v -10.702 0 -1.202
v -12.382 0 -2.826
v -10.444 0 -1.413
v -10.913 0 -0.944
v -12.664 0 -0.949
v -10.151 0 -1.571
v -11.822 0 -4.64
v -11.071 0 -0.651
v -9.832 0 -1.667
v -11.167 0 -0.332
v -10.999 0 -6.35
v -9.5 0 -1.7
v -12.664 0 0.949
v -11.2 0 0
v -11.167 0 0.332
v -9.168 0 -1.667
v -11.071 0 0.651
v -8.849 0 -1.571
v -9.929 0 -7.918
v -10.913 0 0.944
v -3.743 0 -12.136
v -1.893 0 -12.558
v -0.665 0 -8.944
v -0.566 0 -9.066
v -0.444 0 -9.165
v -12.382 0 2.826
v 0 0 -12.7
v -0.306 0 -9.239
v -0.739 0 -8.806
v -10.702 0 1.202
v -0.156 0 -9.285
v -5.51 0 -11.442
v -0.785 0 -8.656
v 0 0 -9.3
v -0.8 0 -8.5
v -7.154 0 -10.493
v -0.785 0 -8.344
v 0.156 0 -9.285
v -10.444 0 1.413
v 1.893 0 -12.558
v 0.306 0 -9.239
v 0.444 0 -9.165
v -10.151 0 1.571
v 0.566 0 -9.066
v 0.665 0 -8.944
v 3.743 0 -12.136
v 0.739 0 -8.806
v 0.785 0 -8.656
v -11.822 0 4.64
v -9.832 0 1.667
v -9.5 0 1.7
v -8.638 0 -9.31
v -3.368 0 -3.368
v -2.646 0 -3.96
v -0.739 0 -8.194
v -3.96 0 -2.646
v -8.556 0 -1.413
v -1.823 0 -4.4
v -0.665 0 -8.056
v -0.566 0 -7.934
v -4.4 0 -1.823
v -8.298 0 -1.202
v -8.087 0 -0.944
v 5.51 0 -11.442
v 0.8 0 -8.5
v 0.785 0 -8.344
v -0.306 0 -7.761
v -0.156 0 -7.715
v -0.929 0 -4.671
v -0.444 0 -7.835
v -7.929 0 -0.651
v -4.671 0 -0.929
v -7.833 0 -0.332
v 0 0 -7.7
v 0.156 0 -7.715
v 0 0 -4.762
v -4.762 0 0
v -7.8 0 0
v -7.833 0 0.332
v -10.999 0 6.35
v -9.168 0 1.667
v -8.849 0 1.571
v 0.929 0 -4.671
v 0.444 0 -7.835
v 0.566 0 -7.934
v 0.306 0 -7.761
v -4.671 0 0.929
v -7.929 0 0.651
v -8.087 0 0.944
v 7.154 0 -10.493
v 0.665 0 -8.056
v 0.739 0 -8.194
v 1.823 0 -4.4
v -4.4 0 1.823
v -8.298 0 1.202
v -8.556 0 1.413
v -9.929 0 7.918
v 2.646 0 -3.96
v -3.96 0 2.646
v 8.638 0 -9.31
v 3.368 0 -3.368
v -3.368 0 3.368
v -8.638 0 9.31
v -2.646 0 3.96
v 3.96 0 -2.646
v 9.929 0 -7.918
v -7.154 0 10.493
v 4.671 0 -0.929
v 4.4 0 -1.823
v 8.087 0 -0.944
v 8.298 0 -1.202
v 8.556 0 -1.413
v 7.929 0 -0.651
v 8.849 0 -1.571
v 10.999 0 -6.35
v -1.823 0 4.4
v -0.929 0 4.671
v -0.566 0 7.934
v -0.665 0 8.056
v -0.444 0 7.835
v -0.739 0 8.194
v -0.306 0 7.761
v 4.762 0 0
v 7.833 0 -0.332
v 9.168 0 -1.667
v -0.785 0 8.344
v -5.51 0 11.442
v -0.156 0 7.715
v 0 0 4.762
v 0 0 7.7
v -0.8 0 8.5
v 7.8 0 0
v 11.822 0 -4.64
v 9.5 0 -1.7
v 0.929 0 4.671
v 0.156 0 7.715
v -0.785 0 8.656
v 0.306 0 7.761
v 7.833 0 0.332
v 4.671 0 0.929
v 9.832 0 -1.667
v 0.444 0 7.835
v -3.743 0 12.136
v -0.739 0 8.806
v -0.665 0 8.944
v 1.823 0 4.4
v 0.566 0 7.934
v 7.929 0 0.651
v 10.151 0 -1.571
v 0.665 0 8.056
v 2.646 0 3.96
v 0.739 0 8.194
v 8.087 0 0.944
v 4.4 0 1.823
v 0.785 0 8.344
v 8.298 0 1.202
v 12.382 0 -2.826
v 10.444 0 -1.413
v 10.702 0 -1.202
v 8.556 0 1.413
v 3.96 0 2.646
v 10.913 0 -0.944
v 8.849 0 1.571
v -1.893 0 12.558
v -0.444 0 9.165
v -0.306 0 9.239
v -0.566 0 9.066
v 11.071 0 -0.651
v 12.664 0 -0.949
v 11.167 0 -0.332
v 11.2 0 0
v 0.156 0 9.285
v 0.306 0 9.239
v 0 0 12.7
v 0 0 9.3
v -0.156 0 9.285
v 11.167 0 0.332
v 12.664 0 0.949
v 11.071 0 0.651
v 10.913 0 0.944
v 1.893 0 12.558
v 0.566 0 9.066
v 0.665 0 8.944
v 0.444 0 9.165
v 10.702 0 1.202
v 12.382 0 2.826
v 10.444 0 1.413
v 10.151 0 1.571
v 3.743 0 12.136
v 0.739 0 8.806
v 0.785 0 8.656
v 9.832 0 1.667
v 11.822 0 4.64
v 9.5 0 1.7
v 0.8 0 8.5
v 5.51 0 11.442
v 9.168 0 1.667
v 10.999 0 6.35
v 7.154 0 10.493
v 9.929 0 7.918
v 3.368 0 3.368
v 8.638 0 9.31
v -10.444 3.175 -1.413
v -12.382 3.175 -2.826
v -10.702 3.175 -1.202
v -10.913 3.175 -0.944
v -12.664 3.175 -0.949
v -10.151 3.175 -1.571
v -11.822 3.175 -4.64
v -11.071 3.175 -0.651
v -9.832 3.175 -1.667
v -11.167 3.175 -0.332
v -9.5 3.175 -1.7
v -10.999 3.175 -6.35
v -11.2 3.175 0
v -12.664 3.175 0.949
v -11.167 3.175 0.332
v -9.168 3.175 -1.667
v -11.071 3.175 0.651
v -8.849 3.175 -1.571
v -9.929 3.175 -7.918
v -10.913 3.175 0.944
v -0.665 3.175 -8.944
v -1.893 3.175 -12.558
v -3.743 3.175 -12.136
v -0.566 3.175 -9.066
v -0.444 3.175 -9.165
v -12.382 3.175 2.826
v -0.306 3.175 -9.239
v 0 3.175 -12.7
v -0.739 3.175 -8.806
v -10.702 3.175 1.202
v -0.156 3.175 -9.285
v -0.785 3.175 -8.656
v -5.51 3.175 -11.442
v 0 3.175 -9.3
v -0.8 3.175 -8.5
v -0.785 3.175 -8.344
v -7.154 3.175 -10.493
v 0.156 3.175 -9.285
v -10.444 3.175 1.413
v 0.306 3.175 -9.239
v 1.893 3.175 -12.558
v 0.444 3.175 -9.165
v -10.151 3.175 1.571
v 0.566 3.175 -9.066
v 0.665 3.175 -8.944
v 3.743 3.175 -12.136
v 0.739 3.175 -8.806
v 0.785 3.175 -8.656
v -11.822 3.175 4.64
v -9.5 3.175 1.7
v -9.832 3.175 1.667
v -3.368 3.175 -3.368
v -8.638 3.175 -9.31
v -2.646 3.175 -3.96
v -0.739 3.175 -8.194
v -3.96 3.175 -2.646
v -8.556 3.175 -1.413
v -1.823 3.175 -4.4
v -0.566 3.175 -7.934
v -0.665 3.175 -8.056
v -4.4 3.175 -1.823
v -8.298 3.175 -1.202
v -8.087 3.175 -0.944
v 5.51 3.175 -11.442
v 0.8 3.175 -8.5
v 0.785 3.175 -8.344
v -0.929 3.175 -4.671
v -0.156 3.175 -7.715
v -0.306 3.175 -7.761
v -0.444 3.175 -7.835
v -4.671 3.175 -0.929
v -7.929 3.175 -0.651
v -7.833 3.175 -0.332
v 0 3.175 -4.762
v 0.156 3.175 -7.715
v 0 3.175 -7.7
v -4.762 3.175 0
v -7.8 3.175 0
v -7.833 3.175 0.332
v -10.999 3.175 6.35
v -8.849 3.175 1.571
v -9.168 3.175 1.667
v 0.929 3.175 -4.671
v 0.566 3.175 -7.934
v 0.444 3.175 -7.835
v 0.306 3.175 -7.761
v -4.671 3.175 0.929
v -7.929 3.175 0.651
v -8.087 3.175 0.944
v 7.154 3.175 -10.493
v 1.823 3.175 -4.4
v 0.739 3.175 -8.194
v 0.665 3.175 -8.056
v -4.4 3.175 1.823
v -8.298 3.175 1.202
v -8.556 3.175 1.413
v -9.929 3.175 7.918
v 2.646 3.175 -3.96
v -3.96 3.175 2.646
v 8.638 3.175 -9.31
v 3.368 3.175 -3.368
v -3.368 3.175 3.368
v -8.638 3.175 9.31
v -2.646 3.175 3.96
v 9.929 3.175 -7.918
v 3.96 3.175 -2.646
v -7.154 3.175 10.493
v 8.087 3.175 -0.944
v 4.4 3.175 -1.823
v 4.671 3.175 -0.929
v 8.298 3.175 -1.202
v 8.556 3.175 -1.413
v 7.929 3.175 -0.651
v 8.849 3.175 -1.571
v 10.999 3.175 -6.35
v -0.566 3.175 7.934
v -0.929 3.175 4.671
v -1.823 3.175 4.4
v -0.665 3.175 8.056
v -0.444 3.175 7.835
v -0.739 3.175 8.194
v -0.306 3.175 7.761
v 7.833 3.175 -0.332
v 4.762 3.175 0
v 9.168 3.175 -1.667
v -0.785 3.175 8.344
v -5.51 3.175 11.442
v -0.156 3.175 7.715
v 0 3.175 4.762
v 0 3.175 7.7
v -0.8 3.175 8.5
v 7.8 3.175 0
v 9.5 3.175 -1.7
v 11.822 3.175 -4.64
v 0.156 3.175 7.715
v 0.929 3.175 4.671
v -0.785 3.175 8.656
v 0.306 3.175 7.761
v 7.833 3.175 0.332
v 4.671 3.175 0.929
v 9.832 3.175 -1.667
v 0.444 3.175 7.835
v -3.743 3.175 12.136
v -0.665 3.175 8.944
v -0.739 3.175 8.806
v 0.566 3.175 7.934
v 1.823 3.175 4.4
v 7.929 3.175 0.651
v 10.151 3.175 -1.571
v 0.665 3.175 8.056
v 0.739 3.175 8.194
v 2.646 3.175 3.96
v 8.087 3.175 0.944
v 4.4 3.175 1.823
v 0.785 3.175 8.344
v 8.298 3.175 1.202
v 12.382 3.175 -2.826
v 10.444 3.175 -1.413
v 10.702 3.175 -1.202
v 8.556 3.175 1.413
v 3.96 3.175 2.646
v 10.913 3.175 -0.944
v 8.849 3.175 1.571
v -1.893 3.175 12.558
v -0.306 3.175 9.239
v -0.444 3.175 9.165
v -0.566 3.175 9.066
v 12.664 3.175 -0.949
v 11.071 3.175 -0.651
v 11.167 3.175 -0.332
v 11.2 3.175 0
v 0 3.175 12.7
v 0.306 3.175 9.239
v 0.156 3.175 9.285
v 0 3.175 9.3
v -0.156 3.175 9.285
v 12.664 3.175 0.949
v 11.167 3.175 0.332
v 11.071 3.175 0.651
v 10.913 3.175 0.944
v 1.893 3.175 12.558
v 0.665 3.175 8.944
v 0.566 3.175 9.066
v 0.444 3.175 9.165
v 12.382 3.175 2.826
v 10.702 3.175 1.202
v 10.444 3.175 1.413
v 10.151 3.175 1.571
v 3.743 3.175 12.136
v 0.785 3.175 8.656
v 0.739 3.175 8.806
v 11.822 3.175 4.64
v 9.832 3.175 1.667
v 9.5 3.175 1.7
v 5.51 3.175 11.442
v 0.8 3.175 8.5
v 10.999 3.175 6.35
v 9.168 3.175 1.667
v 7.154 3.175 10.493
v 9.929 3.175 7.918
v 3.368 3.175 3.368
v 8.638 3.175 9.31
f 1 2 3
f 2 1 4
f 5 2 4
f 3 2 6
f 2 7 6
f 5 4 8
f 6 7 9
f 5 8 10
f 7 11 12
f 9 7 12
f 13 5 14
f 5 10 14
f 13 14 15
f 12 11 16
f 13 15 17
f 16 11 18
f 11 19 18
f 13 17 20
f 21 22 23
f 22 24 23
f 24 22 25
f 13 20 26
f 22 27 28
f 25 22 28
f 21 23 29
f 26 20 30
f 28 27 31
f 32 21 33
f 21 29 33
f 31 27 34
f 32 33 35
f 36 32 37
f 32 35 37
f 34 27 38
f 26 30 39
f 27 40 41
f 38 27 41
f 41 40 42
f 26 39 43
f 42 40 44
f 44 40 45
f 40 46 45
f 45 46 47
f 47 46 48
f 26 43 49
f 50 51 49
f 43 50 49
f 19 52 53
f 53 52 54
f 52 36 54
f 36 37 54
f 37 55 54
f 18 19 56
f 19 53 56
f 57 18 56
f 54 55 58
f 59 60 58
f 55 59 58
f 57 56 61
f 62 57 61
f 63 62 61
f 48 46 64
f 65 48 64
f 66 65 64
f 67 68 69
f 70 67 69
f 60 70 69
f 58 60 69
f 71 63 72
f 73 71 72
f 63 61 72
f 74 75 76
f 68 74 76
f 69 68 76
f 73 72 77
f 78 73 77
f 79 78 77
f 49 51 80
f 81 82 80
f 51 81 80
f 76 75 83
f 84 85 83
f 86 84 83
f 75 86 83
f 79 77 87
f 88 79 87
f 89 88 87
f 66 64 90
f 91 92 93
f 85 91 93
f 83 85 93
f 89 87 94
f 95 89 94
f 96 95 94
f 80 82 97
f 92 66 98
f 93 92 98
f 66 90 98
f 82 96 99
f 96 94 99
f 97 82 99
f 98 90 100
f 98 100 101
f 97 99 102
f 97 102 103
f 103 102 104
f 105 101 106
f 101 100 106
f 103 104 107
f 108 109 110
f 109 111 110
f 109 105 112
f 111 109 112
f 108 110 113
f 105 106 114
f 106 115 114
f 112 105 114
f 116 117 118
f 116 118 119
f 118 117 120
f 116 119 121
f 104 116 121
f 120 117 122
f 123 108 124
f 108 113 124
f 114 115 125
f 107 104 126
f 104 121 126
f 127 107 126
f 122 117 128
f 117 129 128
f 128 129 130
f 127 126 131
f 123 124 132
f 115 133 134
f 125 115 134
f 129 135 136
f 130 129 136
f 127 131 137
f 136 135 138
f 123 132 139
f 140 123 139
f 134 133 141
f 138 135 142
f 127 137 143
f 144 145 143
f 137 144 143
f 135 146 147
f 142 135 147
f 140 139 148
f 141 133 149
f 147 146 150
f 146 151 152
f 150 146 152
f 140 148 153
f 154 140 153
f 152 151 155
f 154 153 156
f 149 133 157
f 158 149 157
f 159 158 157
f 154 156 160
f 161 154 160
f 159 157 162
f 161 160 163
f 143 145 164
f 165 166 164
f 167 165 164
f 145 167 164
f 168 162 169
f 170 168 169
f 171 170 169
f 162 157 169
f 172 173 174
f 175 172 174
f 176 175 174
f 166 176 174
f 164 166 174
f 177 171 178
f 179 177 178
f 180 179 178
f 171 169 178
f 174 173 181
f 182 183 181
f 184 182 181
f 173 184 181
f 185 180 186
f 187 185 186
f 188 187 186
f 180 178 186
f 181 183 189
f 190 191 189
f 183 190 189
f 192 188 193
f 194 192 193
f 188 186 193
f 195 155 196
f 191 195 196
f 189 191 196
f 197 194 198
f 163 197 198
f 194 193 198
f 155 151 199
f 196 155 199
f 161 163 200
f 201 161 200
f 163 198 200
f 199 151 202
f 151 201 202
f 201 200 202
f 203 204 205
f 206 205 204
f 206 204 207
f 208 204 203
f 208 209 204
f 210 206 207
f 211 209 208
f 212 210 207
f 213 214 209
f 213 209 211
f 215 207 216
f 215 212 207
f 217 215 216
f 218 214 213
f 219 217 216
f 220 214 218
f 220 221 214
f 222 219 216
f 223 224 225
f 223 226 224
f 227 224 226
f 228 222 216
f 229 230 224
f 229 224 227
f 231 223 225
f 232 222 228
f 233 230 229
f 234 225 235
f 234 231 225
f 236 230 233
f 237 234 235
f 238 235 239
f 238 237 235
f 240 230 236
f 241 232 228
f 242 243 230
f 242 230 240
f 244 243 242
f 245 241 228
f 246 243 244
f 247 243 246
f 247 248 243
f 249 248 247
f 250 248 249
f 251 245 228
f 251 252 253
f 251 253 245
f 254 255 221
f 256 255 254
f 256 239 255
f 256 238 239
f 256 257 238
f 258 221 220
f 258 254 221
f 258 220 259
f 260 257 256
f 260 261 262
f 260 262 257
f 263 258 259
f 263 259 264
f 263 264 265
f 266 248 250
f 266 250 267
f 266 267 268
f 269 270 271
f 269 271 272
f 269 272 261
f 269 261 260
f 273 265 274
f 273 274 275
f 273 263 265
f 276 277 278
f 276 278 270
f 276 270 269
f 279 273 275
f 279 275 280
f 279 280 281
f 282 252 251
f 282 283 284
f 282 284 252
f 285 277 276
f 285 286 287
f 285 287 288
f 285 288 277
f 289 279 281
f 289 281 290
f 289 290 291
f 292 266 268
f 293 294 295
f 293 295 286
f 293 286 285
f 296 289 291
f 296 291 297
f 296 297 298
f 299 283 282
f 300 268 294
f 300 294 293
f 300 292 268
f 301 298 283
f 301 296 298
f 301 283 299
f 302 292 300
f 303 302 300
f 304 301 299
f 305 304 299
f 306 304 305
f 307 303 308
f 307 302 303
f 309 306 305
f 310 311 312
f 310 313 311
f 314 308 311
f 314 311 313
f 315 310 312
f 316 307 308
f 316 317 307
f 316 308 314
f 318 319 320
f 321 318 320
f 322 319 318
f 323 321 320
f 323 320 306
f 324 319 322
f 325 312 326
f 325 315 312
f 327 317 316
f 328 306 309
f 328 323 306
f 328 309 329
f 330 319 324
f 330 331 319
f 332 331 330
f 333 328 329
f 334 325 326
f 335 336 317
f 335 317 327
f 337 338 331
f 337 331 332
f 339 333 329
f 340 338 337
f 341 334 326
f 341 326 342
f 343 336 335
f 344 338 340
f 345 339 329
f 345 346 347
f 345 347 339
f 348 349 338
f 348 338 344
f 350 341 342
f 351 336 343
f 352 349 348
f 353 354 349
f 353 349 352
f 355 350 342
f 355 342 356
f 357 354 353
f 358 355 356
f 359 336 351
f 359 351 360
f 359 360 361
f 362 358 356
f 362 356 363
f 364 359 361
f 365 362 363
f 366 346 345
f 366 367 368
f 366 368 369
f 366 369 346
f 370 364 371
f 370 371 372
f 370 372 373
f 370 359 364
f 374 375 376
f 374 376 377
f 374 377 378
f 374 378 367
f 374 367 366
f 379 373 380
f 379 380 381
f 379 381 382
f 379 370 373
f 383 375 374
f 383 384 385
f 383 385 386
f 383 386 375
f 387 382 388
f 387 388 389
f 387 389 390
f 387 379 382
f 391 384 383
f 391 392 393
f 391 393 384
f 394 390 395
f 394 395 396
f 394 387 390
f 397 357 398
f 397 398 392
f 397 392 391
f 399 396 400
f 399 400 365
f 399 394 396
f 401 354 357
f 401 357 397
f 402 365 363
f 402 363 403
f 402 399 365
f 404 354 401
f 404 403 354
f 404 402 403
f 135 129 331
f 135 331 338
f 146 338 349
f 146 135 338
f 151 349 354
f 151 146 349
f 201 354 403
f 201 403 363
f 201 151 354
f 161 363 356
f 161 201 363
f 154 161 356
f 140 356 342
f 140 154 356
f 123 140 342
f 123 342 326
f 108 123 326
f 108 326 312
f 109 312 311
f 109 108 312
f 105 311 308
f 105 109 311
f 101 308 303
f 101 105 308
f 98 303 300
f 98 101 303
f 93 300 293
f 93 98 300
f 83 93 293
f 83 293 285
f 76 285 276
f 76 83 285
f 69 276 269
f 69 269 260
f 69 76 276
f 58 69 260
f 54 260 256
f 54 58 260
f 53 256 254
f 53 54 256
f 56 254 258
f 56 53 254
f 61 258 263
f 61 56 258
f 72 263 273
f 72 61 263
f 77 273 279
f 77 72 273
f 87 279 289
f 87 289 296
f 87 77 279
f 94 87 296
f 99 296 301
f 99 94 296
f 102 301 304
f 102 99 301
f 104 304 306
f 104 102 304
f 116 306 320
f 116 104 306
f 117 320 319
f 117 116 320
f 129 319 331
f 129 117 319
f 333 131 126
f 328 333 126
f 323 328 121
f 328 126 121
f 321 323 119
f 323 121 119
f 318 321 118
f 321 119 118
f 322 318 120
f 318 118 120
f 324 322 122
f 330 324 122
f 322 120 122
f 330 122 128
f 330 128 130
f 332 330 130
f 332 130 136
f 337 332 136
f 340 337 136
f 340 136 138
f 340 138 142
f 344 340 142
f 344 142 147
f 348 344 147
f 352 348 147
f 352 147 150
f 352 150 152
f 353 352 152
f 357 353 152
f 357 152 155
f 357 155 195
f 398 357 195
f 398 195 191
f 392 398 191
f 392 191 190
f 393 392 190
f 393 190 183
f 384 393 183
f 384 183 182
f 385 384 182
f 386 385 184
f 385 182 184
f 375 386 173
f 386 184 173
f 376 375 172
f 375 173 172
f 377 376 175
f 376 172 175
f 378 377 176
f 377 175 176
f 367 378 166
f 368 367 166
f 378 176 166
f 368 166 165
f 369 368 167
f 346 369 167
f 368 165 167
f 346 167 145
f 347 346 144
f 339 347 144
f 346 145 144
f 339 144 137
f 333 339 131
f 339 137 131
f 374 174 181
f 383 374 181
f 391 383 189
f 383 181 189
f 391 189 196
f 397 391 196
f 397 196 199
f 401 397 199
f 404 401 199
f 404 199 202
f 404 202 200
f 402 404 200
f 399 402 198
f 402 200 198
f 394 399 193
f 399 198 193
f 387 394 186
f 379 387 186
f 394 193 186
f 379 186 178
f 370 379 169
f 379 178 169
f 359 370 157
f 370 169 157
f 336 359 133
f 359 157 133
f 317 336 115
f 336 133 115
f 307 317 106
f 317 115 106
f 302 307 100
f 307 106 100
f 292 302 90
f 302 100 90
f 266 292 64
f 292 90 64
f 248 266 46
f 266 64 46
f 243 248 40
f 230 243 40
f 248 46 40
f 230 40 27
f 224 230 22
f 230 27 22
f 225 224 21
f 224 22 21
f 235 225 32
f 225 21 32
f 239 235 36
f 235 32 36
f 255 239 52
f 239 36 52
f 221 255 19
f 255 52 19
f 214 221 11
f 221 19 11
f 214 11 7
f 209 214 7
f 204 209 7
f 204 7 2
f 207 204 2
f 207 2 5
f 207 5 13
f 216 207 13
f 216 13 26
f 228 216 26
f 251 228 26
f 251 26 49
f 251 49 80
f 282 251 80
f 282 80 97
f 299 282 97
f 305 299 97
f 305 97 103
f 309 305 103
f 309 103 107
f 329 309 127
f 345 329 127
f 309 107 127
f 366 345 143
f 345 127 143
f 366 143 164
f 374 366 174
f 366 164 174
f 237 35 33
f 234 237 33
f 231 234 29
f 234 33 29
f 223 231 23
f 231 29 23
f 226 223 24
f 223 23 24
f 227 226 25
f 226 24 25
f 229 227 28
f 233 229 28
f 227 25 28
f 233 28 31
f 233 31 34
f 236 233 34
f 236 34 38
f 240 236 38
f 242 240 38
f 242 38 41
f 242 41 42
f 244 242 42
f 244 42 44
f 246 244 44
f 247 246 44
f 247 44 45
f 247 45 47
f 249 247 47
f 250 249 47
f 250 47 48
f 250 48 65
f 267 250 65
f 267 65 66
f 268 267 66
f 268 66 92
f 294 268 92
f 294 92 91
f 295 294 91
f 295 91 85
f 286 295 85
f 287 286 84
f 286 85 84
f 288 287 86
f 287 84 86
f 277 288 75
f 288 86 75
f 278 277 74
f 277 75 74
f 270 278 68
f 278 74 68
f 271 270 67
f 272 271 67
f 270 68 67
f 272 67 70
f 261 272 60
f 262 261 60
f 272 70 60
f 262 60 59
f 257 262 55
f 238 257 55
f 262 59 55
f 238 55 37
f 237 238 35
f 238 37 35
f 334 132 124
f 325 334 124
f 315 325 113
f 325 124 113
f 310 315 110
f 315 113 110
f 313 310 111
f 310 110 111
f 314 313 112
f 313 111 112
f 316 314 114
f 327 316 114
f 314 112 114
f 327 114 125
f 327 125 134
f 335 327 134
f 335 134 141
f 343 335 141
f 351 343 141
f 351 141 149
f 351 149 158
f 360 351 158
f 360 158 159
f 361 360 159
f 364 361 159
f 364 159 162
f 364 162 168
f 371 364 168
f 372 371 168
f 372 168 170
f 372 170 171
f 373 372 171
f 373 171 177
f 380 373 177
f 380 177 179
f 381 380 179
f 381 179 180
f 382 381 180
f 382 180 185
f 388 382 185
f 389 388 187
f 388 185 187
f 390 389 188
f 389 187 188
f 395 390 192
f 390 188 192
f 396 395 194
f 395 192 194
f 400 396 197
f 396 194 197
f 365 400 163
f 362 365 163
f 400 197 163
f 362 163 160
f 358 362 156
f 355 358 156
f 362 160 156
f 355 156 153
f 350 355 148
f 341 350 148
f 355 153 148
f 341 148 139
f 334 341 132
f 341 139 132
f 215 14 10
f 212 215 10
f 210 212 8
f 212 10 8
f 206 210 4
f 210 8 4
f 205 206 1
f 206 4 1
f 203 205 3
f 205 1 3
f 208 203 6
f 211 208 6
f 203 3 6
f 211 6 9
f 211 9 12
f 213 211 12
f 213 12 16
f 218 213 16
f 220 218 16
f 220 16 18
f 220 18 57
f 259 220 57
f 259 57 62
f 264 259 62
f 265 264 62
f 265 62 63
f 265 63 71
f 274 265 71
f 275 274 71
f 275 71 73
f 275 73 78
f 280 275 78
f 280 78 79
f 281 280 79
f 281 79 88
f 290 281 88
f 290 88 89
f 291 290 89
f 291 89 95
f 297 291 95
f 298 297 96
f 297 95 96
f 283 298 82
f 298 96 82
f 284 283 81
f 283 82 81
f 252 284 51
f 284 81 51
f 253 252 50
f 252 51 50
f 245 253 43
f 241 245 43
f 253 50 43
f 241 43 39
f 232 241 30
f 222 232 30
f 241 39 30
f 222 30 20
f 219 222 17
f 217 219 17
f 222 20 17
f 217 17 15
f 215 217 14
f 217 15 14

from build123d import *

# Parameters (mm, degrees)
SKETCH1_R                       = 12.7
SKETCH1_R_2                     = 4.7625
BOSS_EXTRUDE1_DEPTH             = 3.175
M3_CLEARANCE_HOLE1_D            = 3.4
M3_CLEARANCE_HOLE1_DEPTH        = 6.35
M3_CLEARANCE_HOLE1_TIP          = 1.021463052
TAP_DRILL_FOR_M2X0_4_TAP1_D     = 1.6
TAP_DRILL_FOR_M2X0_4_TAP1_DEPTH = 6.35
TAP_DRILL_FOR_M2X0_4_TAP1_TIP   = 0.480688495


with BuildPart() as part:
    # Sketch1 → Boss-Extrude1 (new body)
    with BuildSketch(Plane(origin=(0, 0, 0), x_dir=(1, 0, 0), z_dir=(0, 1, 0))):
        with Locations(Location((0, 0, 0), (0, 0, 270))):
            Circle(SKETCH1_R)
        with Locations(Location((0, 0, 0), (0, 0, 270))):
            Circle(SKETCH1_R_2, mode=Mode.SUBTRACT)
    extrude(amount=BOSS_EXTRUDE1_DEPTH)

    # M3 Clearance Hole1
    with Locations(Plane(origin=(0, 3.175, 0), x_dir=(1, 0, 0), z_dir=(0, 1, 0))):
        with Locations((-9.5, 0), (9.5, 0)):
            Hole(M3_CLEARANCE_HOLE1_D / 2, depth=M3_CLEARANCE_HOLE1_DEPTH)
            with Locations((0, 0, -(M3_CLEARANCE_HOLE1_DEPTH + M3_CLEARANCE_HOLE1_TIP / 2))):  # 118° drill point
                Cone(0, M3_CLEARANCE_HOLE1_D / 2, M3_CLEARANCE_HOLE1_TIP, mode=Mode.SUBTRACT)

    # Tap Drill for M2x0.4 Tap1
    with Locations(Plane(origin=(0, 3.175, 0), x_dir=(1, 0, 0), z_dir=(0, 1, 0))):
        with Locations((0, 8.5), (0, -8.5)):
            Hole(TAP_DRILL_FOR_M2X0_4_TAP1_D / 2, depth=TAP_DRILL_FOR_M2X0_4_TAP1_DEPTH)
            with Locations((0, 0, -(TAP_DRILL_FOR_M2X0_4_TAP1_DEPTH + TAP_DRILL_FOR_M2X0_4_TAP1_TIP / 2))):  # 118° drill point
                Cone(0, TAP_DRILL_FOR_M2X0_4_TAP1_D / 2, TAP_DRILL_FOR_M2X0_4_TAP1_TIP, mode=Mode.SUBTRACT)


solid = part.part
